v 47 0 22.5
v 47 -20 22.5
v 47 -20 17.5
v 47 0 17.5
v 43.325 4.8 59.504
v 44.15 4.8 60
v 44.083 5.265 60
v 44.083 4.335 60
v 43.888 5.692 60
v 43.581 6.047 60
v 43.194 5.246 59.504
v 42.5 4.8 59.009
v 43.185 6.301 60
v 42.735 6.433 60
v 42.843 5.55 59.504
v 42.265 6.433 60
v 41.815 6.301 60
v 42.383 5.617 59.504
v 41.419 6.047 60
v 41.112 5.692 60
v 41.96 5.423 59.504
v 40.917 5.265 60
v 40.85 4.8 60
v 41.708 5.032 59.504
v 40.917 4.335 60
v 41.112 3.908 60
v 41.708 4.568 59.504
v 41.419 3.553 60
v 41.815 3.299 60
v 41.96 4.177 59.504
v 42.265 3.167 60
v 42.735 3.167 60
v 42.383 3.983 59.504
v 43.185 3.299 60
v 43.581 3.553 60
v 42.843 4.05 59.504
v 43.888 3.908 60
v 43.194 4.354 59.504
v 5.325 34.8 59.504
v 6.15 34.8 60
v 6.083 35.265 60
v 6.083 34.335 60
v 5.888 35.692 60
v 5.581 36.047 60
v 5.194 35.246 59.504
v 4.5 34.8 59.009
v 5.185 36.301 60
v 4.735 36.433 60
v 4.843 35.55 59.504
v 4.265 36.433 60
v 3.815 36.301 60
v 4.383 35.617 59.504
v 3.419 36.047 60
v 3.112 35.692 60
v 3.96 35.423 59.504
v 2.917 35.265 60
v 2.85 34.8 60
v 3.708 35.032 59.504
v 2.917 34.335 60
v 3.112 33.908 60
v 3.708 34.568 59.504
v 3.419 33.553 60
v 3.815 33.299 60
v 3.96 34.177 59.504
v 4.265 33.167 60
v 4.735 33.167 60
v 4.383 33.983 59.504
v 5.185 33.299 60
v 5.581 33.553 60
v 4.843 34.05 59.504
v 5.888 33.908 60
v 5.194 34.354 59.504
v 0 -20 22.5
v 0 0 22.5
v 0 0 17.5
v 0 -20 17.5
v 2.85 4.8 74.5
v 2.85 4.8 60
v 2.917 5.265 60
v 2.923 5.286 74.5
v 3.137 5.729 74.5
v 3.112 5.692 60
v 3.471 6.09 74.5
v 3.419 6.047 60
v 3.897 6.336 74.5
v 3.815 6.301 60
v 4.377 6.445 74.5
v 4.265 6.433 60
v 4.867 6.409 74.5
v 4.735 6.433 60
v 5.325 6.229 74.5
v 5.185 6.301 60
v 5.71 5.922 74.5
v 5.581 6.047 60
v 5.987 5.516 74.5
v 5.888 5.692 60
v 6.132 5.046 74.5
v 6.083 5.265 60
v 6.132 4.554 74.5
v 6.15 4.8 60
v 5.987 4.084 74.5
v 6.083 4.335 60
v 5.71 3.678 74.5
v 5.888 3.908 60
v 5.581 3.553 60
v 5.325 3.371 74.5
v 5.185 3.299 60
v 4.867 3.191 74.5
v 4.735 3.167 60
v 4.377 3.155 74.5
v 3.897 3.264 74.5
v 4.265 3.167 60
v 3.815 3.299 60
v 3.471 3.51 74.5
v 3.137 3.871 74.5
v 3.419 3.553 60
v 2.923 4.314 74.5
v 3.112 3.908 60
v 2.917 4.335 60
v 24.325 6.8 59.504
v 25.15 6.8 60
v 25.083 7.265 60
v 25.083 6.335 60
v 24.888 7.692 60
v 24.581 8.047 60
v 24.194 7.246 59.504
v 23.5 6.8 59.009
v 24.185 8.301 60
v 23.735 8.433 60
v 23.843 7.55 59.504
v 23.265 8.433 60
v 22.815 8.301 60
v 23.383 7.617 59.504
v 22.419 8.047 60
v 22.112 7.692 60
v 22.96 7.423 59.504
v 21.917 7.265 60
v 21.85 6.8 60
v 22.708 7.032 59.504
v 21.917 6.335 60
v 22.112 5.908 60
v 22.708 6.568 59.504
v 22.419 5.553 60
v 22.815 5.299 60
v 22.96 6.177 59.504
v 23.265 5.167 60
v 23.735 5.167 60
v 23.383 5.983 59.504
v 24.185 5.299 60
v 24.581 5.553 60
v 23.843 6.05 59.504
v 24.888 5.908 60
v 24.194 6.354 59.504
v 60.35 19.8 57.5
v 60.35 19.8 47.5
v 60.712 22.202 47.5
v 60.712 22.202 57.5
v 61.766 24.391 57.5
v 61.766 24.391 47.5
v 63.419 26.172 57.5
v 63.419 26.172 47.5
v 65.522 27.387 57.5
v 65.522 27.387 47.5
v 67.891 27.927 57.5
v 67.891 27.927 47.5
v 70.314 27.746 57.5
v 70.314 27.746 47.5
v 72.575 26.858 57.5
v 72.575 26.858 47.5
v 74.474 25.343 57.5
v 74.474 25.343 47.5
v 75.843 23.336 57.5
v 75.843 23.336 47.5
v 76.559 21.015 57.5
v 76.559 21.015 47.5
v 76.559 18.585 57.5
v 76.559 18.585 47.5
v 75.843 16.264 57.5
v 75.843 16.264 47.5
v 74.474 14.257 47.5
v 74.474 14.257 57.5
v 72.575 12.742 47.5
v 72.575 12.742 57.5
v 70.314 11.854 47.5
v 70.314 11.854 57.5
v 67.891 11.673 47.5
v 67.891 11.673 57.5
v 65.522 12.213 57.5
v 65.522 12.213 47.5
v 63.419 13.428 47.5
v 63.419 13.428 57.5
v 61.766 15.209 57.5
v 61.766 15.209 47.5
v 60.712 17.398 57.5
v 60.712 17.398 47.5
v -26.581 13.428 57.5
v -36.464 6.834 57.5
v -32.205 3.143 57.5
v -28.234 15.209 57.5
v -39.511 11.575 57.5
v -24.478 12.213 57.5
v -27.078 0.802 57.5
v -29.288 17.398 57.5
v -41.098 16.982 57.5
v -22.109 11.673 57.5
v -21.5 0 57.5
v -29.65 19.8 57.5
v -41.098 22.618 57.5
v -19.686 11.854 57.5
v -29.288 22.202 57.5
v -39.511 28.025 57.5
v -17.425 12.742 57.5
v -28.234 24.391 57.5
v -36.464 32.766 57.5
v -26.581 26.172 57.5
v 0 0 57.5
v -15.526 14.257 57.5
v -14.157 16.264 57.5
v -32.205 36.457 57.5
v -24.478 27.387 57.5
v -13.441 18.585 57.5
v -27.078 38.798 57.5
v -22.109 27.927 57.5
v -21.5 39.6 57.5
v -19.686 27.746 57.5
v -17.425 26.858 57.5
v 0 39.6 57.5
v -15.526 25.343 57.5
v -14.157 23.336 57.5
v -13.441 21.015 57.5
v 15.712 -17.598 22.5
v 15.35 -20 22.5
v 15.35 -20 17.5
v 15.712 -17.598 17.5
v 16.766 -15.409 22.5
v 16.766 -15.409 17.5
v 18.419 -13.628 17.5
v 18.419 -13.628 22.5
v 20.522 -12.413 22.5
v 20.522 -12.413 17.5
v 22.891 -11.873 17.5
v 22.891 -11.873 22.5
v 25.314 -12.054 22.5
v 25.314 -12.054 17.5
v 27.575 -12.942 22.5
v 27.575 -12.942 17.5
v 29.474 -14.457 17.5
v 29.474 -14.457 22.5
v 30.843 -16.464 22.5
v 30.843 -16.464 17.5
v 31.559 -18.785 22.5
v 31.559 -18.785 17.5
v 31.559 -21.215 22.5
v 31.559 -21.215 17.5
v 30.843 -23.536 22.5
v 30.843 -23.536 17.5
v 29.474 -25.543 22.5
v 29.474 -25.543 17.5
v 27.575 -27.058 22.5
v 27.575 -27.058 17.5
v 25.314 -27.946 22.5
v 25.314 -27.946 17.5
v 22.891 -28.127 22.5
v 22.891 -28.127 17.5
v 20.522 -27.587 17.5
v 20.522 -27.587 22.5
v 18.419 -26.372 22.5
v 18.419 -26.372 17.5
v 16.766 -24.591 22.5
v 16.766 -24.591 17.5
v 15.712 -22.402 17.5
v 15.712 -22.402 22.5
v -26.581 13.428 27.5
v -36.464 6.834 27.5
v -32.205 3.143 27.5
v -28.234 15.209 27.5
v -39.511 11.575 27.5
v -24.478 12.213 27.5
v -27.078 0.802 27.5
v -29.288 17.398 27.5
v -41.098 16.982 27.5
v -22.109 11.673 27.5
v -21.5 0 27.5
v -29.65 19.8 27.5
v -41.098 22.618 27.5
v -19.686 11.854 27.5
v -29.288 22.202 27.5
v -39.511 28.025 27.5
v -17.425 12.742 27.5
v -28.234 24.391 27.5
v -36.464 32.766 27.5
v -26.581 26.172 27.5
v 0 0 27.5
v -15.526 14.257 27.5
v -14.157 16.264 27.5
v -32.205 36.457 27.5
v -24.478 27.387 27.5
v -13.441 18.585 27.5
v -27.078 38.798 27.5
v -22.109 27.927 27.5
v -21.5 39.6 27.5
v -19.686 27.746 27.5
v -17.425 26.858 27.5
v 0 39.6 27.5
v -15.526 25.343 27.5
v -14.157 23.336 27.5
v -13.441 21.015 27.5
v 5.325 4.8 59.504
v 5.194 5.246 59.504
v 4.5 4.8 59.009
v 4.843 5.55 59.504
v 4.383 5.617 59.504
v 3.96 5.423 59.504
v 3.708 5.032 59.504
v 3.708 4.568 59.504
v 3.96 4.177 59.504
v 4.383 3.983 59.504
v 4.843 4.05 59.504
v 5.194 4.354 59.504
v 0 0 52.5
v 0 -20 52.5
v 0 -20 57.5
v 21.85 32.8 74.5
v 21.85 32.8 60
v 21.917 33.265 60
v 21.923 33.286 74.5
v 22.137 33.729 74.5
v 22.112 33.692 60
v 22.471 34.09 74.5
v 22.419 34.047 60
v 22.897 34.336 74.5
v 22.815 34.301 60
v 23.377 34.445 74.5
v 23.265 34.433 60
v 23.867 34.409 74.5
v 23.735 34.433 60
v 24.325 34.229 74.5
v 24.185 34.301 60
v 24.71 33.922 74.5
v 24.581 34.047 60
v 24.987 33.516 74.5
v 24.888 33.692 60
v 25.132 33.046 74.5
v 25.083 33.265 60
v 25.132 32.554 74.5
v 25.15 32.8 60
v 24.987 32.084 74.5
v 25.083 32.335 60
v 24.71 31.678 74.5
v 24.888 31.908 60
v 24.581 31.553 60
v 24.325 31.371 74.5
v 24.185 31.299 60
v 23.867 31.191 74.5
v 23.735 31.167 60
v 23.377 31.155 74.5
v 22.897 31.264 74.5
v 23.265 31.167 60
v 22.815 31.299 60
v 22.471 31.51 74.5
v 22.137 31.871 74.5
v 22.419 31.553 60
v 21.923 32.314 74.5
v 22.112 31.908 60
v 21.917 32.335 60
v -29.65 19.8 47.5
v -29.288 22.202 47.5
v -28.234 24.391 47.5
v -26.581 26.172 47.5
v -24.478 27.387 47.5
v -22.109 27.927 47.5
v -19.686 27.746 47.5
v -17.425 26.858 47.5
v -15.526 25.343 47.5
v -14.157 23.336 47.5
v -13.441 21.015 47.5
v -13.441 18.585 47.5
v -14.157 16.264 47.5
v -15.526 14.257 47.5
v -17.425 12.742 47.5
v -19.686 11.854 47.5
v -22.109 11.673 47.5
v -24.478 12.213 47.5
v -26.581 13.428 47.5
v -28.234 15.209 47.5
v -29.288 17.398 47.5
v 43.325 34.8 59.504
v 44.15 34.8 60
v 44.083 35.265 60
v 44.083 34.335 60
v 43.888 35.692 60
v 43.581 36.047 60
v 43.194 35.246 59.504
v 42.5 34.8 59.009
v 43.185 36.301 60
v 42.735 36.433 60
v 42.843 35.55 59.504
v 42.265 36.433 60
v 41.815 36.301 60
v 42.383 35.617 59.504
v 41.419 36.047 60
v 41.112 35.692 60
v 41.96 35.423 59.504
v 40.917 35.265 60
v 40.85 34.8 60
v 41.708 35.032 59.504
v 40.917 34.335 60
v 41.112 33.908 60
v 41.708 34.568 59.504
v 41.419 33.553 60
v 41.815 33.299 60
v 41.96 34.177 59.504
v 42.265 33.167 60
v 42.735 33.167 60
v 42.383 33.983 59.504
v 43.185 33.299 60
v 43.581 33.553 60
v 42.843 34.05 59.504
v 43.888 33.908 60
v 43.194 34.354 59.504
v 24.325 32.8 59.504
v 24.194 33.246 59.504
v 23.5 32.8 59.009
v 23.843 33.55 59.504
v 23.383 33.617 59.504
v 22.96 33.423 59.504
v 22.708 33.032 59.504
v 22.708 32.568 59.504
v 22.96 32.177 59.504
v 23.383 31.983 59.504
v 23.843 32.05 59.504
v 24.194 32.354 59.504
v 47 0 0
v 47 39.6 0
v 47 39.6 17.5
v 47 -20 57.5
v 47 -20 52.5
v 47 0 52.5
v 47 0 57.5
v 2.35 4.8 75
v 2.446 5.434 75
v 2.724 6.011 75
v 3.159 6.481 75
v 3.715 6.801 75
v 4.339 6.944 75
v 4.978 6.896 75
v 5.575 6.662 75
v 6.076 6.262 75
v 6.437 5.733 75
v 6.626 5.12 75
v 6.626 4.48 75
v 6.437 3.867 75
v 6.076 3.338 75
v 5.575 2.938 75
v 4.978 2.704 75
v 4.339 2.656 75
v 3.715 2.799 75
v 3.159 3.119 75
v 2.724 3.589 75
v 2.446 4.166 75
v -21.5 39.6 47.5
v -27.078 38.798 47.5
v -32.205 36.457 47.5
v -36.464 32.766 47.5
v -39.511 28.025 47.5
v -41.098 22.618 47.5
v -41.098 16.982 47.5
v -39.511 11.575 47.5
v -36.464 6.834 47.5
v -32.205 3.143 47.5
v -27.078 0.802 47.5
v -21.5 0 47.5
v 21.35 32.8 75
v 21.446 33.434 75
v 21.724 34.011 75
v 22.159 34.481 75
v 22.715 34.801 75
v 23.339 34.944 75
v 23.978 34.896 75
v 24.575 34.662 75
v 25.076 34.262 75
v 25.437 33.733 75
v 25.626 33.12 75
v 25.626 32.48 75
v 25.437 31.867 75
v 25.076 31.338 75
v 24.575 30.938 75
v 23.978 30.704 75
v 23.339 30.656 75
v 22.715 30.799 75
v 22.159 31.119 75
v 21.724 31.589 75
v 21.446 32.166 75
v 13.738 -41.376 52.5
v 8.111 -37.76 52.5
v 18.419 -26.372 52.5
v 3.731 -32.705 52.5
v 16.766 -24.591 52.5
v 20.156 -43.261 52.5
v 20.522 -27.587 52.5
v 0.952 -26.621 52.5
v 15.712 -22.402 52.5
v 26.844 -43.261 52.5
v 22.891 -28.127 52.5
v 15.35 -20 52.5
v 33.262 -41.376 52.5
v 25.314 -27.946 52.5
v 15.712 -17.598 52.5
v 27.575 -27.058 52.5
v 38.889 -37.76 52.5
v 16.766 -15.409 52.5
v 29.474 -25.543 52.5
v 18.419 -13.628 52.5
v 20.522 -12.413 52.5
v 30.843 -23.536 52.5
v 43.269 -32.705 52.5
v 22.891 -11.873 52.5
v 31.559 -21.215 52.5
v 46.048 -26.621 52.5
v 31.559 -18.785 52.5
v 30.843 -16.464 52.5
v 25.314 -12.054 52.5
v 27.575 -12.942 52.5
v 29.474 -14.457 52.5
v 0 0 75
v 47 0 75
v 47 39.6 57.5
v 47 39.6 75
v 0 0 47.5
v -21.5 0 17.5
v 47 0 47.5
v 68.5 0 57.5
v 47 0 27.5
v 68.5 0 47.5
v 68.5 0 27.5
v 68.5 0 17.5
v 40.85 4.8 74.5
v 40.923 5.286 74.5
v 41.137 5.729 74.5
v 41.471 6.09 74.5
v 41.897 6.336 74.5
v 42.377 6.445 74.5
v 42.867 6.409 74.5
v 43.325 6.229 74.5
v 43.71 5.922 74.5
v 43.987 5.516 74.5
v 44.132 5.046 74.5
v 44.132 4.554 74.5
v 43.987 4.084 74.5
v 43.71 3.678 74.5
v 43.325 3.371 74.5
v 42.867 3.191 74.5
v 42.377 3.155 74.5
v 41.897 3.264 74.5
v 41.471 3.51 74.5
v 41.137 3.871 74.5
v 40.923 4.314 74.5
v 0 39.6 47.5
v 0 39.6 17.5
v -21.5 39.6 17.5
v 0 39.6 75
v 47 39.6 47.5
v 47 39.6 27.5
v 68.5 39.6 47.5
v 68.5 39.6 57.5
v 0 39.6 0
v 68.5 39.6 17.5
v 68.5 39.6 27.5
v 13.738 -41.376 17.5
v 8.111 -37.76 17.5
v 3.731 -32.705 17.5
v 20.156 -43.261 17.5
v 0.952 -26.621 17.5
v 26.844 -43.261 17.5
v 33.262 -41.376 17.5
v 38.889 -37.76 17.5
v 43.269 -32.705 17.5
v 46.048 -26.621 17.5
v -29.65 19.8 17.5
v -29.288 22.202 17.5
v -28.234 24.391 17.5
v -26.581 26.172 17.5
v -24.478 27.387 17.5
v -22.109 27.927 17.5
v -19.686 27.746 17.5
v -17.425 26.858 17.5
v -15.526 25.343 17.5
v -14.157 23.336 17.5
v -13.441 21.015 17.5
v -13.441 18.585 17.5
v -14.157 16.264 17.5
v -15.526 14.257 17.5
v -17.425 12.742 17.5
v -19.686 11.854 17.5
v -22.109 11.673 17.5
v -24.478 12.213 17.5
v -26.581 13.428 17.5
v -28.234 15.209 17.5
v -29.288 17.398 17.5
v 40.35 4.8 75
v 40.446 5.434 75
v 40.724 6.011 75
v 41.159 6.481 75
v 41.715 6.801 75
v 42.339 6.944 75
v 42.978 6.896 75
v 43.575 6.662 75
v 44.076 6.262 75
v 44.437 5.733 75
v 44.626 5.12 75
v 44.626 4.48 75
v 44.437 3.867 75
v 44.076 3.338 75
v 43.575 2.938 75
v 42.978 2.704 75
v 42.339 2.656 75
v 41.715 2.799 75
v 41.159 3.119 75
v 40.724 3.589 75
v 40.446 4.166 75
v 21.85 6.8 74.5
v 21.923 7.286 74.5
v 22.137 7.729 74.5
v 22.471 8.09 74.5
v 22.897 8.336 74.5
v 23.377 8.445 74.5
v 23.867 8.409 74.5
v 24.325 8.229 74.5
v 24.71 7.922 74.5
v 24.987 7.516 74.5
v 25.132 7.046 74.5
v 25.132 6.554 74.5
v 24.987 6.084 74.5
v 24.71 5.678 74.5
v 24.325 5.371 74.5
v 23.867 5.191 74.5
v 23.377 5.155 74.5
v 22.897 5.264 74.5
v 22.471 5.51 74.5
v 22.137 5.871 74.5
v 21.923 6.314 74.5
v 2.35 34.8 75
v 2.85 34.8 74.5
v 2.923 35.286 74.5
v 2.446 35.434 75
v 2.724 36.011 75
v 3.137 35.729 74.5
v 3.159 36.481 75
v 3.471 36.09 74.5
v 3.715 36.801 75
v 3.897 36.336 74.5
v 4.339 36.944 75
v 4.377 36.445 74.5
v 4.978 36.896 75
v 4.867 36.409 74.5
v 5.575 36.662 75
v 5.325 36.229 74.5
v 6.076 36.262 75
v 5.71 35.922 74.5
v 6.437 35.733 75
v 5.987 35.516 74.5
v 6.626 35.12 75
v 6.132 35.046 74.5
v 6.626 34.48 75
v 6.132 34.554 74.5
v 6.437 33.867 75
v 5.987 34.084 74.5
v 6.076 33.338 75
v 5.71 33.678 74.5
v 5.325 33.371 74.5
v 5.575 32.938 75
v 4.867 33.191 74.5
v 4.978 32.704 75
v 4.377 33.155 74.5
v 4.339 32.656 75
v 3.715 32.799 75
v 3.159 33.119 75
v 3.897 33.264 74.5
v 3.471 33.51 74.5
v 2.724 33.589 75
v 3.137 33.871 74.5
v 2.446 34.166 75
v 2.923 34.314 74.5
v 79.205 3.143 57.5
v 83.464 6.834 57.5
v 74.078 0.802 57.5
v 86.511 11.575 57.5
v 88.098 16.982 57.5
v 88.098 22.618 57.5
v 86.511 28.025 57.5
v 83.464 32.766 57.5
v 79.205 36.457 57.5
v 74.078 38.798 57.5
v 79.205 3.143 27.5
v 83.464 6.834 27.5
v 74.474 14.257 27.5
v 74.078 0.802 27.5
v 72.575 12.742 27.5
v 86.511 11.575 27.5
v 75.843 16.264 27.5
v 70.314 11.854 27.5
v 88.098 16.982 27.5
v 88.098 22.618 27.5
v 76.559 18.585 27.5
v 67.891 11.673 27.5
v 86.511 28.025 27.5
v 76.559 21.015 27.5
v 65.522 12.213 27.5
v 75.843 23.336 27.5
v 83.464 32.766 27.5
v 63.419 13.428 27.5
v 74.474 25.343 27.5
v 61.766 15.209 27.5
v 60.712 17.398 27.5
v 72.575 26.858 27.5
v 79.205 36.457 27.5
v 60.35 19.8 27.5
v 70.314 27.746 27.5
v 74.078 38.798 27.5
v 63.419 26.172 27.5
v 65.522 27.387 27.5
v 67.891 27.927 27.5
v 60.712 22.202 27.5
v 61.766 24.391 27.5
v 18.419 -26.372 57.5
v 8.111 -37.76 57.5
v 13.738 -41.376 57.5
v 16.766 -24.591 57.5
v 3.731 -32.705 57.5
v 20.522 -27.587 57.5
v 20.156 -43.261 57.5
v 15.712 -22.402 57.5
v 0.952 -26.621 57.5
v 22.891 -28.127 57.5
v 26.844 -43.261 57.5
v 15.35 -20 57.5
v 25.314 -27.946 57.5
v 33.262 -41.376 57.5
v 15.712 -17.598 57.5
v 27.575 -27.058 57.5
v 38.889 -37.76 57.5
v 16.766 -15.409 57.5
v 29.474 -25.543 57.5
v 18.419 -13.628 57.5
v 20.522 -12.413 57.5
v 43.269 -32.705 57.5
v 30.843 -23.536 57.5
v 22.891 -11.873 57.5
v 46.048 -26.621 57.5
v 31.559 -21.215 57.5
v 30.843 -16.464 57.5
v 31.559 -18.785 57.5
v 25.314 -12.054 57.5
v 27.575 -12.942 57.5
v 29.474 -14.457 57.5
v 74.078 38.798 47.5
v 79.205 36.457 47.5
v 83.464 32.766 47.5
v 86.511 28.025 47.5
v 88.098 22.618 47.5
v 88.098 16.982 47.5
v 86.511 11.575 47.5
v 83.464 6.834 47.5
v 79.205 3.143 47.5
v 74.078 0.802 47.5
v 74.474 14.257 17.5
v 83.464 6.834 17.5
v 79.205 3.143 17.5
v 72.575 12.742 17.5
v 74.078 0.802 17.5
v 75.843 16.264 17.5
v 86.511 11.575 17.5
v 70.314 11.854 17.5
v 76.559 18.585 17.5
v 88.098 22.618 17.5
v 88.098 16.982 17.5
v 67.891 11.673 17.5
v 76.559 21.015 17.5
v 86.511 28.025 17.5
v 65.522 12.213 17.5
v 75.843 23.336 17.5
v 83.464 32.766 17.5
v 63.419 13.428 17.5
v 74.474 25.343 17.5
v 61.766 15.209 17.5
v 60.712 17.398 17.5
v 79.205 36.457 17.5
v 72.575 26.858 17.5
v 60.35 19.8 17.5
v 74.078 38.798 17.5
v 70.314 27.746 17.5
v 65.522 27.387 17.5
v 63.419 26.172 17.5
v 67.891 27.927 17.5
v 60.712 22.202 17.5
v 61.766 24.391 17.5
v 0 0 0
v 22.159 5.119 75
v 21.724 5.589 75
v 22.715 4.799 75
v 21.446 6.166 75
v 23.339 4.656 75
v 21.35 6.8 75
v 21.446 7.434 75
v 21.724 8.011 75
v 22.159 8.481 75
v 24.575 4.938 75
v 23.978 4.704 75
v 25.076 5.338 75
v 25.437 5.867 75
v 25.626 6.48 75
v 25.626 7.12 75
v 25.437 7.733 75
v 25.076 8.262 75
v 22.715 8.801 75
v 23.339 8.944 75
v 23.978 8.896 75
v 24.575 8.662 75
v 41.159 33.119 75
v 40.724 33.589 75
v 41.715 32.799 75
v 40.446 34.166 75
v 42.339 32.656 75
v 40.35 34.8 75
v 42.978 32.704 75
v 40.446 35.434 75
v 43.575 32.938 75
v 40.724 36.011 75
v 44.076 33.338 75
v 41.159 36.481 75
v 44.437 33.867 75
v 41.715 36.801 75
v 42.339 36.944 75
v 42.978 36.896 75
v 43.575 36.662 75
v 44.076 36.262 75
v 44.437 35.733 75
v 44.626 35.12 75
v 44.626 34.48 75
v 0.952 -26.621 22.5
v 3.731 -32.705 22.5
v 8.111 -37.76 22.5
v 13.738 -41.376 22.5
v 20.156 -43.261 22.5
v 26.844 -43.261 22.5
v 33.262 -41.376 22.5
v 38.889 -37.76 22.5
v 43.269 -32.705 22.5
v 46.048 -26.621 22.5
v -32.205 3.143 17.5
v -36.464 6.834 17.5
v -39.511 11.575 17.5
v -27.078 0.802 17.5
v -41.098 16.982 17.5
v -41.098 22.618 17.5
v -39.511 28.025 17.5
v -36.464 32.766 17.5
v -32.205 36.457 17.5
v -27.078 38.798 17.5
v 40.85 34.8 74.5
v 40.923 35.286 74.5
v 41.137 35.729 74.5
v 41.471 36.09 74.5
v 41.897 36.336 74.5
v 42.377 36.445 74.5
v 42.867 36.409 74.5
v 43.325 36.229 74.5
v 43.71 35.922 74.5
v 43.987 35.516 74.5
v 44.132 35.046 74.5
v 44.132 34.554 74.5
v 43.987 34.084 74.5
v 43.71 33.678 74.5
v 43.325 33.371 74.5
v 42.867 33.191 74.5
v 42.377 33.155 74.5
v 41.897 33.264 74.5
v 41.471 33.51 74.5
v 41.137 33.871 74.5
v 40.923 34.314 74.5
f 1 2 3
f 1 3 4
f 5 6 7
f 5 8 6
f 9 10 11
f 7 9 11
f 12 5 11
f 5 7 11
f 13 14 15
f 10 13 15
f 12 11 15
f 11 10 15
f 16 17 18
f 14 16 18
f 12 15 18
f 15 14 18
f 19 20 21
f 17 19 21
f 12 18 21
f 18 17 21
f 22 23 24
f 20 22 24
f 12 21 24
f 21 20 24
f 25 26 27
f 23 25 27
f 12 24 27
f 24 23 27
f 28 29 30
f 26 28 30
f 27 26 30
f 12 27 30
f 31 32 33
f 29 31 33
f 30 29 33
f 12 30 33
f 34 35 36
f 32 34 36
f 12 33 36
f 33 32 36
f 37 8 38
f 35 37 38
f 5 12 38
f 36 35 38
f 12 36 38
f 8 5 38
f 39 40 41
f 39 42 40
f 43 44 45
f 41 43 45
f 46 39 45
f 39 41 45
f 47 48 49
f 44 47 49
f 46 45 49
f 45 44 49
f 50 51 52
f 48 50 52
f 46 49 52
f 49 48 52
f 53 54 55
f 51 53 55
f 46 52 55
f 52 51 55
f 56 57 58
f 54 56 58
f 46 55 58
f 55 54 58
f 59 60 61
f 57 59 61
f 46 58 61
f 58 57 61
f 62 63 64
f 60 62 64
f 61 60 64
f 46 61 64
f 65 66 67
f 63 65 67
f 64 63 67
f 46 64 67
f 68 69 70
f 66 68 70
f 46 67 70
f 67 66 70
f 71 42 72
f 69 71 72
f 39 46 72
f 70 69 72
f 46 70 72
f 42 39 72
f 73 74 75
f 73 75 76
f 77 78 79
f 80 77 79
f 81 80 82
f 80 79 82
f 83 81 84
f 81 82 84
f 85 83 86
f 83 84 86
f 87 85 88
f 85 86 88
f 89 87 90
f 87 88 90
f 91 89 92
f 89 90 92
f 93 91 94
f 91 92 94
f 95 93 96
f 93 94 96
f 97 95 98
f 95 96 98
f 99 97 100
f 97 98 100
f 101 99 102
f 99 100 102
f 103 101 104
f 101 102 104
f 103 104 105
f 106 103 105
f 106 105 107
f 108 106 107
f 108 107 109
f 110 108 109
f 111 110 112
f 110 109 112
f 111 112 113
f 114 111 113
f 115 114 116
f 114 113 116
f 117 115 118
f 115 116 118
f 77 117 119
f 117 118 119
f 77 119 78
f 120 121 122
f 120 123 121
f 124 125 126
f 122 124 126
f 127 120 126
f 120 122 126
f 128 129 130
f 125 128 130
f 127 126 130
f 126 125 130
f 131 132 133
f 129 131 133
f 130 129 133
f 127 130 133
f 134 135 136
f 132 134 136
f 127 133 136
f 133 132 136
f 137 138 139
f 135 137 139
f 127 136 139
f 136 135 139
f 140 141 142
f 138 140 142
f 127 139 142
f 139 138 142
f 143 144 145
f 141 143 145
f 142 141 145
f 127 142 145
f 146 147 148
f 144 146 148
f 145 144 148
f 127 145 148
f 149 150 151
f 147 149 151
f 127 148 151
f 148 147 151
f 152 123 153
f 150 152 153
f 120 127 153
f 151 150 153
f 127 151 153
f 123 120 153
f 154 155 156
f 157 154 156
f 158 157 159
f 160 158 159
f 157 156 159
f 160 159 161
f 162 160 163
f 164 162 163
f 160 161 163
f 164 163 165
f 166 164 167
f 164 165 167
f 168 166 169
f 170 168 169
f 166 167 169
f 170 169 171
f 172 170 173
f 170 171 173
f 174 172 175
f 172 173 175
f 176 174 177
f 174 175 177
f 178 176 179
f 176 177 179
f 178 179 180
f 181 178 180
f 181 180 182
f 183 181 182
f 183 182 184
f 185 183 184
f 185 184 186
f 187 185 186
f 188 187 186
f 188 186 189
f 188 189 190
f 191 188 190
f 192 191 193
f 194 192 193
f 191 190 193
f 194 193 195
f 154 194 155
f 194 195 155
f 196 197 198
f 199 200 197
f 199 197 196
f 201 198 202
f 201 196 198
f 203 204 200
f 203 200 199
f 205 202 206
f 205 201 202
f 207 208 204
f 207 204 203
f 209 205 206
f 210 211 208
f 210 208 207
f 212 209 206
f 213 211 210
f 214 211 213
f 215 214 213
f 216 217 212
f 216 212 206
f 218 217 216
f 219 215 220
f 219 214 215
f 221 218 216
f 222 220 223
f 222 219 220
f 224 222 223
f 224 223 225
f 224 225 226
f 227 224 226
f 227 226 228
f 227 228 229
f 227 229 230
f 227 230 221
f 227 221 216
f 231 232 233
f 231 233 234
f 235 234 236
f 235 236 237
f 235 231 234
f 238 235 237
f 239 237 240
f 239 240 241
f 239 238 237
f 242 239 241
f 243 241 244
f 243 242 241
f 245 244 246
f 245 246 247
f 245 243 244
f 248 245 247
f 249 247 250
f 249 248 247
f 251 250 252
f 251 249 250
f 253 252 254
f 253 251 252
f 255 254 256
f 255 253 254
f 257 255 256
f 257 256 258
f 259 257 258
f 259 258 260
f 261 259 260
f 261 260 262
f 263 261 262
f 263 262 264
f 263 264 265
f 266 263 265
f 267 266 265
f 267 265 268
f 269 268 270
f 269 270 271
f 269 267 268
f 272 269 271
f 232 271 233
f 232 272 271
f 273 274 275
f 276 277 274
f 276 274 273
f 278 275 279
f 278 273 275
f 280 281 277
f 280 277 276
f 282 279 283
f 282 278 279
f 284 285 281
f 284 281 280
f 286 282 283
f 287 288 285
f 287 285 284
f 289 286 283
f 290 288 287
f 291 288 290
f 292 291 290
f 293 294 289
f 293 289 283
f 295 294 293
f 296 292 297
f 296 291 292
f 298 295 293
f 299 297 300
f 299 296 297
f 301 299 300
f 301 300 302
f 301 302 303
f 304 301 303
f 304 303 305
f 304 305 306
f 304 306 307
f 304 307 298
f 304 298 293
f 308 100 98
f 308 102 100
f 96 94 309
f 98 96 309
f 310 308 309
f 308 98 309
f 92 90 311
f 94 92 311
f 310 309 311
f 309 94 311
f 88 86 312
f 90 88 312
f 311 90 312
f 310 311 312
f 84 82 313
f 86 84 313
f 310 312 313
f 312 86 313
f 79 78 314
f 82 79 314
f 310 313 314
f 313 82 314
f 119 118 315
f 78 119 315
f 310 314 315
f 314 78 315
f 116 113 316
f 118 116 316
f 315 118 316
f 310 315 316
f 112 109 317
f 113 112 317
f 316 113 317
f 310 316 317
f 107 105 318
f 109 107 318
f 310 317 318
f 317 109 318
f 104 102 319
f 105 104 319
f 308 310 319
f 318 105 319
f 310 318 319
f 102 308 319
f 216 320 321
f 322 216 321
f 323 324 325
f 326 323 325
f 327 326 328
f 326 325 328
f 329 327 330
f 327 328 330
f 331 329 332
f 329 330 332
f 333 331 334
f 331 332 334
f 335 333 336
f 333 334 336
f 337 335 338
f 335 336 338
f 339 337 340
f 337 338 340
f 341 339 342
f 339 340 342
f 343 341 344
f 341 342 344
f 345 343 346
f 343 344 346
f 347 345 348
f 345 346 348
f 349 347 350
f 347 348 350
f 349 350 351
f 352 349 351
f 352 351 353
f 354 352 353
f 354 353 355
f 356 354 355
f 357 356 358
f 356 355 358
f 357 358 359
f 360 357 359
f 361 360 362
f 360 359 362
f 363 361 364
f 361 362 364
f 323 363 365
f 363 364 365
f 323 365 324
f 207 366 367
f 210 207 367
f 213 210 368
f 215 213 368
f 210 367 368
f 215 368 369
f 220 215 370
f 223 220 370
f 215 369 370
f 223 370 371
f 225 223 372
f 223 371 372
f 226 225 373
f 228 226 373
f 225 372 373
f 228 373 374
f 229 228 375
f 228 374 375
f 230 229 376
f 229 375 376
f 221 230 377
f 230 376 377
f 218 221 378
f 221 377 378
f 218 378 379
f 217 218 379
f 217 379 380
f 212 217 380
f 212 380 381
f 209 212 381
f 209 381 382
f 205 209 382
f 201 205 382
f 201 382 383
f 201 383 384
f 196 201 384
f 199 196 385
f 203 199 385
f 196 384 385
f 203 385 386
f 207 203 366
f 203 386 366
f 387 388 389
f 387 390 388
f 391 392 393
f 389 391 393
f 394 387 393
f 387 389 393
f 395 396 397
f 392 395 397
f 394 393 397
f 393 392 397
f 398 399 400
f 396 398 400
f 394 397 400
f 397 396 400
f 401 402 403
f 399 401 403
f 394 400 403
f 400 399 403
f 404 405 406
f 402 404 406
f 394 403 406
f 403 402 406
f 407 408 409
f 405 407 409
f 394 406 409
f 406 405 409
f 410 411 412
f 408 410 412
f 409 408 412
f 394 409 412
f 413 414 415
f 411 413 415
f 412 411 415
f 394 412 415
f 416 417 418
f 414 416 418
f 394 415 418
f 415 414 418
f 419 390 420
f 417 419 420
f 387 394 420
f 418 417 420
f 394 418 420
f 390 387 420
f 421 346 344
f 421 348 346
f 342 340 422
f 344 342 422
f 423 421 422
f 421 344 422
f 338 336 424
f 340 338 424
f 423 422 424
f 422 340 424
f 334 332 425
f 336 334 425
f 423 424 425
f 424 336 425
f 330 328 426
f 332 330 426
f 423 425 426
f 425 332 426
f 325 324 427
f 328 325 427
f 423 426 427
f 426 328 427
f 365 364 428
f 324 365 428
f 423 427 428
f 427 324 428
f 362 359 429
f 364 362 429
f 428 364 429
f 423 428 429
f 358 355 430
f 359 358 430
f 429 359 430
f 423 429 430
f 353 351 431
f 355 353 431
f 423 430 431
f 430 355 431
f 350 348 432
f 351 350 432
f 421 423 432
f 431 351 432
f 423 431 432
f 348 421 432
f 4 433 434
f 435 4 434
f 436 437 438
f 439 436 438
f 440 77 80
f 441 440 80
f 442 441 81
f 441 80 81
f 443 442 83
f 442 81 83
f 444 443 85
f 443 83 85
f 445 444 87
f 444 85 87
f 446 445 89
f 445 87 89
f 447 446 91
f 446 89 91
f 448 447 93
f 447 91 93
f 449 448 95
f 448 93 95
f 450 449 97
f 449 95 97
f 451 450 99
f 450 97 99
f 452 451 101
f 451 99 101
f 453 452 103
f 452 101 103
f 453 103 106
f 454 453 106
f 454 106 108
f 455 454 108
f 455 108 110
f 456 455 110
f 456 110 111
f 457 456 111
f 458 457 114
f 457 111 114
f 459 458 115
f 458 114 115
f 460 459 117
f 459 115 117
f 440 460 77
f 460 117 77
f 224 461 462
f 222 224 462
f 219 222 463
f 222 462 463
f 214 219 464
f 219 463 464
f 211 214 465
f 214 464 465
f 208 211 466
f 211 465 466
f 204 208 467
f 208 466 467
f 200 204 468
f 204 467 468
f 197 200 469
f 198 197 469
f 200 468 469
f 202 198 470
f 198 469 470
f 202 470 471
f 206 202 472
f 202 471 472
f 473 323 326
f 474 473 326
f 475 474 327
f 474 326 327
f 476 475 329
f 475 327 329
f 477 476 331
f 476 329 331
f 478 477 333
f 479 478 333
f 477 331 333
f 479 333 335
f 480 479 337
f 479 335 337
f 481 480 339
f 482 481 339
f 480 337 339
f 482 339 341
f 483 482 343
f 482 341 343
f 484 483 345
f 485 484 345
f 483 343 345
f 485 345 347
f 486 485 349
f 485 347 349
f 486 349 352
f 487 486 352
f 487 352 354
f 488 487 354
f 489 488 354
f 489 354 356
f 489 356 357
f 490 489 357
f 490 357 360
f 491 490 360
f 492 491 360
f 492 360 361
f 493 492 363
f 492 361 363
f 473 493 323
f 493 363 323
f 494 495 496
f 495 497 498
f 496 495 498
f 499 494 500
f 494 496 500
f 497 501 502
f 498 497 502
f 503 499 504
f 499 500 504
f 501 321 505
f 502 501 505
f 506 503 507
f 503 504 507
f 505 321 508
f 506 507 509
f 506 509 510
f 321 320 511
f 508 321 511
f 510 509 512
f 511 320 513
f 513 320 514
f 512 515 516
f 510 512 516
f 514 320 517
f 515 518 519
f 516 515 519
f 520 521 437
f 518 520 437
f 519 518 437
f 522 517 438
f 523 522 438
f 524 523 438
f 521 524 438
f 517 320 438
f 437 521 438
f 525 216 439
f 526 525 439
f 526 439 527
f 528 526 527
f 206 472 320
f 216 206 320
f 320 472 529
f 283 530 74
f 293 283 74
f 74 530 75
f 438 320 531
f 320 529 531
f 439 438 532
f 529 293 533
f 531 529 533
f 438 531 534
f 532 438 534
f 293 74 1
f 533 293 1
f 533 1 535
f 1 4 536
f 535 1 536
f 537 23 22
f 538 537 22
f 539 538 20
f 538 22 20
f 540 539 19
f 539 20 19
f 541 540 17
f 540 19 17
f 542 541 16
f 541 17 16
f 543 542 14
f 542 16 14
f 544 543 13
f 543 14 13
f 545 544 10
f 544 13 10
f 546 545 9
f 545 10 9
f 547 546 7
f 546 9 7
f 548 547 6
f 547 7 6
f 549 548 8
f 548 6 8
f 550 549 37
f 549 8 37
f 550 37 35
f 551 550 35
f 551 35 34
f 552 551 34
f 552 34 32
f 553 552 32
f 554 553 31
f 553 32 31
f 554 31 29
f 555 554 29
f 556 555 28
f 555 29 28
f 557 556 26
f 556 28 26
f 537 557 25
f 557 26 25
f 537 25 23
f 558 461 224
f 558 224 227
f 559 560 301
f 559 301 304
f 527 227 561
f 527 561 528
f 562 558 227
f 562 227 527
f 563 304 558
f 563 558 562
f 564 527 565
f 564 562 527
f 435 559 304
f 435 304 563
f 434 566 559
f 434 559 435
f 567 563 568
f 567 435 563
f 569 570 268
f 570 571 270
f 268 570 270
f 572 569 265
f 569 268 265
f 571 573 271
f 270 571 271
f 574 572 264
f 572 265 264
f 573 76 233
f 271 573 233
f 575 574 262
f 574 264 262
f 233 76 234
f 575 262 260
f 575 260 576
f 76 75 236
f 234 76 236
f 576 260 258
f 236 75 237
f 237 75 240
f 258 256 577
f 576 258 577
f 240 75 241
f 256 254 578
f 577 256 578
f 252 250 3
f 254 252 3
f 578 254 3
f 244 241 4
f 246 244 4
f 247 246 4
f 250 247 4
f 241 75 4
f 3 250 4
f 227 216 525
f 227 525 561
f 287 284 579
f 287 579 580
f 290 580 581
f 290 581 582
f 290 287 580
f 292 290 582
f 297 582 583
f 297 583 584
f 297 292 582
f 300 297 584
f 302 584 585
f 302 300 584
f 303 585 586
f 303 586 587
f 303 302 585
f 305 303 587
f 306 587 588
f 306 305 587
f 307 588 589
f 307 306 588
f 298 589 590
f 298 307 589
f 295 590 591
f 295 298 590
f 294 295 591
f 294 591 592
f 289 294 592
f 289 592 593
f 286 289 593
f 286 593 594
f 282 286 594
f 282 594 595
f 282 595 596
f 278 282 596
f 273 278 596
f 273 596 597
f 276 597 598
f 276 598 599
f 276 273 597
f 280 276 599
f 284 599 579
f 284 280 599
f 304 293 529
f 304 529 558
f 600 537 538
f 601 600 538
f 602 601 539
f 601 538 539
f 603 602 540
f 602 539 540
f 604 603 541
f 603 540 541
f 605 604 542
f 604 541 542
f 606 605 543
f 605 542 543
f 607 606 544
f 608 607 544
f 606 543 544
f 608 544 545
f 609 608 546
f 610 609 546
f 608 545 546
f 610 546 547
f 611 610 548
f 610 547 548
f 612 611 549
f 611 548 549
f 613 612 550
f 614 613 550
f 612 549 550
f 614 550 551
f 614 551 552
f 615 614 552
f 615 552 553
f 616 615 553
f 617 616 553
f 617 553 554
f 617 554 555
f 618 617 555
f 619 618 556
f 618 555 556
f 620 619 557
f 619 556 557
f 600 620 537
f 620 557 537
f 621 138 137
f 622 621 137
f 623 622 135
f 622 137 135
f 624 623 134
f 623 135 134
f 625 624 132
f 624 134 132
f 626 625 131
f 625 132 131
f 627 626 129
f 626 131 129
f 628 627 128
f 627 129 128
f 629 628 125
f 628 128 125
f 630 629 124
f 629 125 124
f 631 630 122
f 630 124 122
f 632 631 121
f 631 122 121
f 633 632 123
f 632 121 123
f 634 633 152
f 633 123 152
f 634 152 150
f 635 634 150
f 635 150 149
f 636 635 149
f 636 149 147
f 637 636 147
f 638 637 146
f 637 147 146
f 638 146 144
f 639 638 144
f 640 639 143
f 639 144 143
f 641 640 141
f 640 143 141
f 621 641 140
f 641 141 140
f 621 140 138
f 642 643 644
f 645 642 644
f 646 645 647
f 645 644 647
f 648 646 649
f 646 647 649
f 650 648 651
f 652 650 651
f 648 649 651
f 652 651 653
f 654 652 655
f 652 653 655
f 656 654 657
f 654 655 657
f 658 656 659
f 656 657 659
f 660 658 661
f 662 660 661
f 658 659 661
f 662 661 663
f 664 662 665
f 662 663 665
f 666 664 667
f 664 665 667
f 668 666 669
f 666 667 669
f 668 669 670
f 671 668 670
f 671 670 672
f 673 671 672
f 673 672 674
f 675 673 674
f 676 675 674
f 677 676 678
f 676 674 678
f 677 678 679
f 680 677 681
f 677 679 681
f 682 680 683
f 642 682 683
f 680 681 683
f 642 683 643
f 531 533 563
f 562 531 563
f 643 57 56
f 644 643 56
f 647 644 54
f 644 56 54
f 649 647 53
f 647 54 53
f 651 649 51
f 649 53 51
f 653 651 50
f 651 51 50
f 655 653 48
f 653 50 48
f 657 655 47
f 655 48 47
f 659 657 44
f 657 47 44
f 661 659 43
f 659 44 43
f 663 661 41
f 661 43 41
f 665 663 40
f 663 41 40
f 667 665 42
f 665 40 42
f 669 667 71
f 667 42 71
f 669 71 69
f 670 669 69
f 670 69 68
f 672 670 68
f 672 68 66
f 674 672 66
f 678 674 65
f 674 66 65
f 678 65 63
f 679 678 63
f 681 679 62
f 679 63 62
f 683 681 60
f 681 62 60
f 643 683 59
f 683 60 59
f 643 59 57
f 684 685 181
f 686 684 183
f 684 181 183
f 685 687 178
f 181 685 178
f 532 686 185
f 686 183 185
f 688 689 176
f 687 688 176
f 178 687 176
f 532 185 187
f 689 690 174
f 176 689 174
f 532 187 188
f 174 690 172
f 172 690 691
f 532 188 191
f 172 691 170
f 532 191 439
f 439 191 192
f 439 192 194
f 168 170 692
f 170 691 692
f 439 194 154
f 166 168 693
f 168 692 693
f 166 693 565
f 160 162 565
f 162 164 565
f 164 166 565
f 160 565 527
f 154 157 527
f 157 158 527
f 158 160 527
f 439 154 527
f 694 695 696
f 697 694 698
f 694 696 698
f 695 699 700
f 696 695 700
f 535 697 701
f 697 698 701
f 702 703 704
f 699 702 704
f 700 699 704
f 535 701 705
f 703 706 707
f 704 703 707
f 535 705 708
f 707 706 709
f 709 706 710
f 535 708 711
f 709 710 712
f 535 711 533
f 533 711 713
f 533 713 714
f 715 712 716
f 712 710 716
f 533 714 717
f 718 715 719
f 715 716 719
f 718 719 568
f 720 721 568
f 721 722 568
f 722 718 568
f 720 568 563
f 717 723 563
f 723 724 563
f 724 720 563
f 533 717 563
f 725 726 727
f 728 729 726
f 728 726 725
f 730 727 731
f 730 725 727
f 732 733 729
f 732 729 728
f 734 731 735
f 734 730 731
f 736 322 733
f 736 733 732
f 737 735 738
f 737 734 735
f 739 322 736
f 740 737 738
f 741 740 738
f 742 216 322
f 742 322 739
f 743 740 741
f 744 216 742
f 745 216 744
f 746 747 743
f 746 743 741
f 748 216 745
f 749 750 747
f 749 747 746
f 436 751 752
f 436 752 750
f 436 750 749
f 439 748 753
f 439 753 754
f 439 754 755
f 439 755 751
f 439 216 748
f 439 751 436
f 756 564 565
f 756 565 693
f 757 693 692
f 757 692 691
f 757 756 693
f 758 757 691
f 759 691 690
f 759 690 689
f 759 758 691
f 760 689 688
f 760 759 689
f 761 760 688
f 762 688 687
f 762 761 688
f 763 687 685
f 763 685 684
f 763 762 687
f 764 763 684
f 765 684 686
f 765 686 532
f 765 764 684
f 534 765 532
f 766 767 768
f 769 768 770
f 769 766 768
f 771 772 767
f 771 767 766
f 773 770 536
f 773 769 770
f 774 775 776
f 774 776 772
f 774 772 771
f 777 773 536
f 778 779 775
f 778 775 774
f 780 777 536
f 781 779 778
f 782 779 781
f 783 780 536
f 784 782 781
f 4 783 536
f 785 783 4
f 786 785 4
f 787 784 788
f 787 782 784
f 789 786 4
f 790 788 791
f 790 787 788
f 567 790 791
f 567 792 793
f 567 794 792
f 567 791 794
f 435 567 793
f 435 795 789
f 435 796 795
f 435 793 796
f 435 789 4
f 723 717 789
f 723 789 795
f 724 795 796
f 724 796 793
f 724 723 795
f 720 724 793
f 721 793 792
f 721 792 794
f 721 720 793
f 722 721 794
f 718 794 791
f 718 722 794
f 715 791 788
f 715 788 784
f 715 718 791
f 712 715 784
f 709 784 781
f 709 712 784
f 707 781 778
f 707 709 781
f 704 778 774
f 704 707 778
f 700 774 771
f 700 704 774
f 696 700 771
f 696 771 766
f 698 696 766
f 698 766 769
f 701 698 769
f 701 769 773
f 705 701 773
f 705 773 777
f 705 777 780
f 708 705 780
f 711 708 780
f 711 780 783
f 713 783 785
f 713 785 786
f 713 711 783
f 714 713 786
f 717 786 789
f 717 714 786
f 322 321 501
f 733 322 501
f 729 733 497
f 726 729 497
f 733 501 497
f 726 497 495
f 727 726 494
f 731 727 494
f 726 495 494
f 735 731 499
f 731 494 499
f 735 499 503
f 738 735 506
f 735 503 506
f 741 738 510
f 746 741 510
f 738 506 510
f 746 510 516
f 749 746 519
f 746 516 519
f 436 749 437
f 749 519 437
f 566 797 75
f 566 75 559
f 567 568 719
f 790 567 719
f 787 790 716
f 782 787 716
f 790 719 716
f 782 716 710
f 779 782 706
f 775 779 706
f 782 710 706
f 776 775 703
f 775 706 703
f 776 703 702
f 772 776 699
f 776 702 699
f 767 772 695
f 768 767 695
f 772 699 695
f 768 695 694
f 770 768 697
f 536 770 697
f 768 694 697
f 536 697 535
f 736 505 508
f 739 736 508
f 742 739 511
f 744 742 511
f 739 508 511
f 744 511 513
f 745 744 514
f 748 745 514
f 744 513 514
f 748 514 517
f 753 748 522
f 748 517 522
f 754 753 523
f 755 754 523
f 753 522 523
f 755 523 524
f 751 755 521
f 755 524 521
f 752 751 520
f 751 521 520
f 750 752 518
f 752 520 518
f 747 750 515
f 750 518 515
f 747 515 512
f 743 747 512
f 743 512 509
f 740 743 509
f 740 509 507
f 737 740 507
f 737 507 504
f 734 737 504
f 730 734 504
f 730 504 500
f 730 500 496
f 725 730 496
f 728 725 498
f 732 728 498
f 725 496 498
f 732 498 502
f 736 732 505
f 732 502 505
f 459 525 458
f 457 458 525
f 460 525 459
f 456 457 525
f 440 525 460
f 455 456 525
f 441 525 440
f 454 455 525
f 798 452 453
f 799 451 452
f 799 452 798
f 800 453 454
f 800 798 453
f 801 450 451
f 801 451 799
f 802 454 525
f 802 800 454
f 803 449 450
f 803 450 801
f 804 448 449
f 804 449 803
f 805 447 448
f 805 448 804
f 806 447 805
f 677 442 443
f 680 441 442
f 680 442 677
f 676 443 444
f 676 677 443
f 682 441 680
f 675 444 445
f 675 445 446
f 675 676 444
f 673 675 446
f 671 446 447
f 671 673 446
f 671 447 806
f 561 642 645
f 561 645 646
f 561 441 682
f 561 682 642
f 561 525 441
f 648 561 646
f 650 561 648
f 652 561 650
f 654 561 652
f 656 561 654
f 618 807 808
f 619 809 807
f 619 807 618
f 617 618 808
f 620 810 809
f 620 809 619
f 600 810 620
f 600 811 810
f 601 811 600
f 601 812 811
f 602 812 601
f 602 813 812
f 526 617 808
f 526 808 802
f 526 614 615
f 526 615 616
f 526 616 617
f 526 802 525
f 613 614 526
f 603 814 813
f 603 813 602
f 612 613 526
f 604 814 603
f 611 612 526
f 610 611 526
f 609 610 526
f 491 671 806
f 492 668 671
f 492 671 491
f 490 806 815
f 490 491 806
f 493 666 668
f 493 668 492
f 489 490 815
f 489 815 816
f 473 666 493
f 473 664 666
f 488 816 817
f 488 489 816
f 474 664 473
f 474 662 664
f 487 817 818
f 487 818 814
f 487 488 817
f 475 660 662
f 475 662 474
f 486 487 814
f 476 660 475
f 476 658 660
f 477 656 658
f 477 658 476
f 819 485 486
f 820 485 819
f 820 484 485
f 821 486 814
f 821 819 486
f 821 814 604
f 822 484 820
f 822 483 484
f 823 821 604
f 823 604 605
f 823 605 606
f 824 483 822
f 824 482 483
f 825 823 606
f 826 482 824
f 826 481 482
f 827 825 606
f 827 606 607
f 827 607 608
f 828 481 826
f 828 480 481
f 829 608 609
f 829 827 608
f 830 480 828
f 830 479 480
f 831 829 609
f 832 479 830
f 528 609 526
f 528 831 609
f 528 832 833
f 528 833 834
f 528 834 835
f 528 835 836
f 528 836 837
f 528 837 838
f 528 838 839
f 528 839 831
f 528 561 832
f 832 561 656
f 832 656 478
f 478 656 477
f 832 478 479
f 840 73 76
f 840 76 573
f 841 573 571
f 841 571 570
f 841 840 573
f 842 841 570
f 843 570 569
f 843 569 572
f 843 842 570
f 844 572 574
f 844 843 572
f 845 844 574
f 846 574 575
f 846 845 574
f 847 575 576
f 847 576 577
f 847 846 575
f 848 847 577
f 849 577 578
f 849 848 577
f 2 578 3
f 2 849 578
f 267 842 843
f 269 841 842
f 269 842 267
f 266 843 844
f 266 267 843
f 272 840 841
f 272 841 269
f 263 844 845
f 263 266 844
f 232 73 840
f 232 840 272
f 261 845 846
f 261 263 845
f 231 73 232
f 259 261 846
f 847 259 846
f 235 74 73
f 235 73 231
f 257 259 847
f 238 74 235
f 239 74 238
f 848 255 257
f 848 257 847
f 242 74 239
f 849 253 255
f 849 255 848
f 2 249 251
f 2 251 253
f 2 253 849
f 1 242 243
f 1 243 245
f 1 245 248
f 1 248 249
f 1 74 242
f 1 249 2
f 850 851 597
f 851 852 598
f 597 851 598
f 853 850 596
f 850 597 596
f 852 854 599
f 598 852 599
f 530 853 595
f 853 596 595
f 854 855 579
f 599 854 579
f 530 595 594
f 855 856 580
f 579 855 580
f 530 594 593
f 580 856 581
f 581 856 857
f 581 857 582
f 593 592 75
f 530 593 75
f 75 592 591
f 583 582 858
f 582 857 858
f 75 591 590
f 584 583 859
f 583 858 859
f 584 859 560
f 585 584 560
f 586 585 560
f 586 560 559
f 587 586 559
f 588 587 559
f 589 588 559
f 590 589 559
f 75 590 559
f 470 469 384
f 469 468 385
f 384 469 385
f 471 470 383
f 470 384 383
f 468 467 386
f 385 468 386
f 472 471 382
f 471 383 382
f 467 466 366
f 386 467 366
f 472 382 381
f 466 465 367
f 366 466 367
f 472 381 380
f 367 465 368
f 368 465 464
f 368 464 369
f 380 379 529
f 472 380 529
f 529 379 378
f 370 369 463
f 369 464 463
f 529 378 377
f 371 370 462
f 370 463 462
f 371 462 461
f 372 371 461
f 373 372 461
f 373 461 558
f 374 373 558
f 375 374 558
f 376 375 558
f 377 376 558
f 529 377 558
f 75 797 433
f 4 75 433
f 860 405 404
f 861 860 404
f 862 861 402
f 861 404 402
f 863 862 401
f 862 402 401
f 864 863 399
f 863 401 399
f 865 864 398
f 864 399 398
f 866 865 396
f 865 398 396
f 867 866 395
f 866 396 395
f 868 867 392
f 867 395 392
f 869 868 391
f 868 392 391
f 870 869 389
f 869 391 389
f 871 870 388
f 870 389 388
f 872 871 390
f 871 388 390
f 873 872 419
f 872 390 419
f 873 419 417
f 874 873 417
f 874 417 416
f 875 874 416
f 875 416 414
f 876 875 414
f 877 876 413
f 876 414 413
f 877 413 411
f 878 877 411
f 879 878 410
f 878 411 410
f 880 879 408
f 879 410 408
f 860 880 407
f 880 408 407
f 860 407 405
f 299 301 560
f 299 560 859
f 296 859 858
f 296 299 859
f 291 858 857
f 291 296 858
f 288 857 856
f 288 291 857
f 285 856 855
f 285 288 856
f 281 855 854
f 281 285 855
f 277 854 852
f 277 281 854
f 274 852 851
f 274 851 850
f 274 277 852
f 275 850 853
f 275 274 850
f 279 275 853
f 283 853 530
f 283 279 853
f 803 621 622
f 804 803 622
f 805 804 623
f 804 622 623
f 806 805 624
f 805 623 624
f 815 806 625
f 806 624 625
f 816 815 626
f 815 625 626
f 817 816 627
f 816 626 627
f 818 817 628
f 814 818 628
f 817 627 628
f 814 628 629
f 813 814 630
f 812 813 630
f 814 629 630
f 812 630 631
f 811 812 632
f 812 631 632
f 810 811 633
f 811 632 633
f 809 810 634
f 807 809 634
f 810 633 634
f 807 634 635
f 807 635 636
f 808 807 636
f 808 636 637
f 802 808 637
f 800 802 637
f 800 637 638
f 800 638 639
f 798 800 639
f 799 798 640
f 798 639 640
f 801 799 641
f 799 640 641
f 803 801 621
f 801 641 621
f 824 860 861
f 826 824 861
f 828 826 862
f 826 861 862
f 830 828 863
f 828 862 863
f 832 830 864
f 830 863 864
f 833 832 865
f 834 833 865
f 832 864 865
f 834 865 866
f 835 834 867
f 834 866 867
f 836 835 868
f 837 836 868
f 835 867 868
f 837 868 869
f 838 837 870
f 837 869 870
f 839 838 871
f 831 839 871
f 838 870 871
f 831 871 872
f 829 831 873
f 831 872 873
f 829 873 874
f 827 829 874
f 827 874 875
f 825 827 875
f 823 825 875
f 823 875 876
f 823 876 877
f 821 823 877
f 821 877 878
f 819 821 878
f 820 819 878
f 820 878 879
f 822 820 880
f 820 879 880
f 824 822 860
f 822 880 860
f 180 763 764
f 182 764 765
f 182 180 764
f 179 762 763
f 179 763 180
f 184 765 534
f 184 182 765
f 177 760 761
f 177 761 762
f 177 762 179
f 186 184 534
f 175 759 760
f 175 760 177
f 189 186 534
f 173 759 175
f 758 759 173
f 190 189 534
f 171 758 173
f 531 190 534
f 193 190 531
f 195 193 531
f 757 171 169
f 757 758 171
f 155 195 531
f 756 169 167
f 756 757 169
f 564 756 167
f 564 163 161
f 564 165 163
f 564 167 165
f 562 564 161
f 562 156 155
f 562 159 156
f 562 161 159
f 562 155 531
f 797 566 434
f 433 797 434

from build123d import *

# Parameters (mm, degrees)
SZKIC1_W                       = 47
SZKIC1_H                       = 39.6
DODANIE_WYCI_GNI_CIE3_DEPTH    = 75
SZKIC4_R                       = 8.15
DODANIE_WYCI_GNI_CIE4_DEPTH    = 10
SZKIC5_R                       = 8.15
DODANIE_WYCI_GNI_CIE5_DEPTH    = 5
OTW_R_GWINTOWANY_M4X0_71_D     = 3.3
OTW_R_GWINTOWANY_M4X0_71_DEPTH = 15
OTW_R_GWINTOWANY_M4X0_71_TIP   = 0.991420021
SFAZOWANIE1_SIZE               = 0.5


with BuildPart() as part:
    # Szkic1 → Dodanie-wyciągnięcie3 (new body)
    with BuildSketch(Plane.XY):
        with Locations((23.5, 19.8)):
            Rectangle(SZKIC1_W, SZKIC1_H)
    extrude(amount=DODANIE_WYCI_GNI_CIE3_DEPTH)

    # Szkic4 → Dodanie-wyciągnięcie4 (add)
    with BuildSketch(Plane(origin=(0, 0, 27.5), x_dir=(-1, 0, 0), z_dir=(0, 0, -1))):
        with BuildLine():
            Line((-47, 39.6), (-68.5, 39.6))
            ThreePointArc((-68.5, 39.6), (-88.3, 19.8), (-68.5, 0))
            Line((-68.5, 0), (-47, 0))
            Line((-47, 0), (-47, 39.6))
        make_face()
        with Locations((-68.5, 19.8)):
            Circle(SZKIC4_R, mode=Mode.SUBTRACT)
        with BuildLine():
            Line((21.5, 0), (0, 0))
            Line((0, 0), (0, 39.6))
            Line((0, 39.6), (21.5, 39.6))
            ThreePointArc((21.5, 39.6), (41.3, 19.8), (21.5, 0))
        make_face()
        with Locations((21.5, 19.8)):
            Circle(SZKIC4_R, mode=Mode.SUBTRACT)
    dodanie_wyci_gni_cie4 = extrude(amount=DODANIE_WYCI_GNI_CIE4_DEPTH)

    # Lustro1: Dodanie-wyciągnięcie4 across plane
    add(dodanie_wyci_gni_cie4.mirror(Plane(origin=(0, 0, 37.5), x_dir=(1, 0, 0), z_dir=(0, 0, -1))))

    # Szkic5 → Dodanie-wyciągnięcie5 (add)
    with BuildSketch(Plane(origin=(0, 0, 22.5), x_dir=(-1, 0, 0), z_dir=(0, 0, -1))):
        with BuildLine():
            Line((-47, 0), (0, 0))
            Line((0, 0), (0, -20))
            ThreePointArc((0, -20), (-23.5, -43.5), (-47, -20))
            Line((-47, -20), (-47, 0))
        make_face()
        with Locations((-23.5, -20)):
            Circle(SZKIC5_R, mode=Mode.SUBTRACT)
    dodanie_wyci_gni_cie5 = extrude(amount=DODANIE_WYCI_GNI_CIE5_DEPTH)

    # Lustro2: Dodanie-wyciągnięcie5 across plane
    add(dodanie_wyci_gni_cie5.mirror(Plane(origin=(0, 0, 37.5), x_dir=(1, 0, 0), z_dir=(0, 0, -1))))

    # Otwór gwintowany M4x0.71
    with Locations(Plane.XY.offset(75)):
        with Locations((4.5, 34.8), (23.5, 32.8), (42.5, 34.8), (42.5, 4.8), (23.5, 6.8), (4.5, 4.8)):
            Hole(OTW_R_GWINTOWANY_M4X0_71_D / 2, depth=OTW_R_GWINTOWANY_M4X0_71_DEPTH)
            with Locations((0, 0, -(OTW_R_GWINTOWANY_M4X0_71_DEPTH + OTW_R_GWINTOWANY_M4X0_71_TIP / 2))):  # 118° drill point
                Cone(0, OTW_R_GWINTOWANY_M4X0_71_D / 2, OTW_R_GWINTOWANY_M4X0_71_TIP, mode=Mode.SUBTRACT)

    # Sfazowanie1
    sfazowanie1_edges = [part.edges().sort_by_distance(p)[0] for p in [
        (6.15, 4.8, 75),
        (25.15, 6.8, 75),
        (44.15, 4.8, 75),
        (44.15, 34.8, 75),
        (25.15, 32.8, 75),
        (6.15, 34.8, 75),
    ]]
    chamfer(sfazowanie1_edges, length=SFAZOWANIE1_SIZE)


solid = part.part
